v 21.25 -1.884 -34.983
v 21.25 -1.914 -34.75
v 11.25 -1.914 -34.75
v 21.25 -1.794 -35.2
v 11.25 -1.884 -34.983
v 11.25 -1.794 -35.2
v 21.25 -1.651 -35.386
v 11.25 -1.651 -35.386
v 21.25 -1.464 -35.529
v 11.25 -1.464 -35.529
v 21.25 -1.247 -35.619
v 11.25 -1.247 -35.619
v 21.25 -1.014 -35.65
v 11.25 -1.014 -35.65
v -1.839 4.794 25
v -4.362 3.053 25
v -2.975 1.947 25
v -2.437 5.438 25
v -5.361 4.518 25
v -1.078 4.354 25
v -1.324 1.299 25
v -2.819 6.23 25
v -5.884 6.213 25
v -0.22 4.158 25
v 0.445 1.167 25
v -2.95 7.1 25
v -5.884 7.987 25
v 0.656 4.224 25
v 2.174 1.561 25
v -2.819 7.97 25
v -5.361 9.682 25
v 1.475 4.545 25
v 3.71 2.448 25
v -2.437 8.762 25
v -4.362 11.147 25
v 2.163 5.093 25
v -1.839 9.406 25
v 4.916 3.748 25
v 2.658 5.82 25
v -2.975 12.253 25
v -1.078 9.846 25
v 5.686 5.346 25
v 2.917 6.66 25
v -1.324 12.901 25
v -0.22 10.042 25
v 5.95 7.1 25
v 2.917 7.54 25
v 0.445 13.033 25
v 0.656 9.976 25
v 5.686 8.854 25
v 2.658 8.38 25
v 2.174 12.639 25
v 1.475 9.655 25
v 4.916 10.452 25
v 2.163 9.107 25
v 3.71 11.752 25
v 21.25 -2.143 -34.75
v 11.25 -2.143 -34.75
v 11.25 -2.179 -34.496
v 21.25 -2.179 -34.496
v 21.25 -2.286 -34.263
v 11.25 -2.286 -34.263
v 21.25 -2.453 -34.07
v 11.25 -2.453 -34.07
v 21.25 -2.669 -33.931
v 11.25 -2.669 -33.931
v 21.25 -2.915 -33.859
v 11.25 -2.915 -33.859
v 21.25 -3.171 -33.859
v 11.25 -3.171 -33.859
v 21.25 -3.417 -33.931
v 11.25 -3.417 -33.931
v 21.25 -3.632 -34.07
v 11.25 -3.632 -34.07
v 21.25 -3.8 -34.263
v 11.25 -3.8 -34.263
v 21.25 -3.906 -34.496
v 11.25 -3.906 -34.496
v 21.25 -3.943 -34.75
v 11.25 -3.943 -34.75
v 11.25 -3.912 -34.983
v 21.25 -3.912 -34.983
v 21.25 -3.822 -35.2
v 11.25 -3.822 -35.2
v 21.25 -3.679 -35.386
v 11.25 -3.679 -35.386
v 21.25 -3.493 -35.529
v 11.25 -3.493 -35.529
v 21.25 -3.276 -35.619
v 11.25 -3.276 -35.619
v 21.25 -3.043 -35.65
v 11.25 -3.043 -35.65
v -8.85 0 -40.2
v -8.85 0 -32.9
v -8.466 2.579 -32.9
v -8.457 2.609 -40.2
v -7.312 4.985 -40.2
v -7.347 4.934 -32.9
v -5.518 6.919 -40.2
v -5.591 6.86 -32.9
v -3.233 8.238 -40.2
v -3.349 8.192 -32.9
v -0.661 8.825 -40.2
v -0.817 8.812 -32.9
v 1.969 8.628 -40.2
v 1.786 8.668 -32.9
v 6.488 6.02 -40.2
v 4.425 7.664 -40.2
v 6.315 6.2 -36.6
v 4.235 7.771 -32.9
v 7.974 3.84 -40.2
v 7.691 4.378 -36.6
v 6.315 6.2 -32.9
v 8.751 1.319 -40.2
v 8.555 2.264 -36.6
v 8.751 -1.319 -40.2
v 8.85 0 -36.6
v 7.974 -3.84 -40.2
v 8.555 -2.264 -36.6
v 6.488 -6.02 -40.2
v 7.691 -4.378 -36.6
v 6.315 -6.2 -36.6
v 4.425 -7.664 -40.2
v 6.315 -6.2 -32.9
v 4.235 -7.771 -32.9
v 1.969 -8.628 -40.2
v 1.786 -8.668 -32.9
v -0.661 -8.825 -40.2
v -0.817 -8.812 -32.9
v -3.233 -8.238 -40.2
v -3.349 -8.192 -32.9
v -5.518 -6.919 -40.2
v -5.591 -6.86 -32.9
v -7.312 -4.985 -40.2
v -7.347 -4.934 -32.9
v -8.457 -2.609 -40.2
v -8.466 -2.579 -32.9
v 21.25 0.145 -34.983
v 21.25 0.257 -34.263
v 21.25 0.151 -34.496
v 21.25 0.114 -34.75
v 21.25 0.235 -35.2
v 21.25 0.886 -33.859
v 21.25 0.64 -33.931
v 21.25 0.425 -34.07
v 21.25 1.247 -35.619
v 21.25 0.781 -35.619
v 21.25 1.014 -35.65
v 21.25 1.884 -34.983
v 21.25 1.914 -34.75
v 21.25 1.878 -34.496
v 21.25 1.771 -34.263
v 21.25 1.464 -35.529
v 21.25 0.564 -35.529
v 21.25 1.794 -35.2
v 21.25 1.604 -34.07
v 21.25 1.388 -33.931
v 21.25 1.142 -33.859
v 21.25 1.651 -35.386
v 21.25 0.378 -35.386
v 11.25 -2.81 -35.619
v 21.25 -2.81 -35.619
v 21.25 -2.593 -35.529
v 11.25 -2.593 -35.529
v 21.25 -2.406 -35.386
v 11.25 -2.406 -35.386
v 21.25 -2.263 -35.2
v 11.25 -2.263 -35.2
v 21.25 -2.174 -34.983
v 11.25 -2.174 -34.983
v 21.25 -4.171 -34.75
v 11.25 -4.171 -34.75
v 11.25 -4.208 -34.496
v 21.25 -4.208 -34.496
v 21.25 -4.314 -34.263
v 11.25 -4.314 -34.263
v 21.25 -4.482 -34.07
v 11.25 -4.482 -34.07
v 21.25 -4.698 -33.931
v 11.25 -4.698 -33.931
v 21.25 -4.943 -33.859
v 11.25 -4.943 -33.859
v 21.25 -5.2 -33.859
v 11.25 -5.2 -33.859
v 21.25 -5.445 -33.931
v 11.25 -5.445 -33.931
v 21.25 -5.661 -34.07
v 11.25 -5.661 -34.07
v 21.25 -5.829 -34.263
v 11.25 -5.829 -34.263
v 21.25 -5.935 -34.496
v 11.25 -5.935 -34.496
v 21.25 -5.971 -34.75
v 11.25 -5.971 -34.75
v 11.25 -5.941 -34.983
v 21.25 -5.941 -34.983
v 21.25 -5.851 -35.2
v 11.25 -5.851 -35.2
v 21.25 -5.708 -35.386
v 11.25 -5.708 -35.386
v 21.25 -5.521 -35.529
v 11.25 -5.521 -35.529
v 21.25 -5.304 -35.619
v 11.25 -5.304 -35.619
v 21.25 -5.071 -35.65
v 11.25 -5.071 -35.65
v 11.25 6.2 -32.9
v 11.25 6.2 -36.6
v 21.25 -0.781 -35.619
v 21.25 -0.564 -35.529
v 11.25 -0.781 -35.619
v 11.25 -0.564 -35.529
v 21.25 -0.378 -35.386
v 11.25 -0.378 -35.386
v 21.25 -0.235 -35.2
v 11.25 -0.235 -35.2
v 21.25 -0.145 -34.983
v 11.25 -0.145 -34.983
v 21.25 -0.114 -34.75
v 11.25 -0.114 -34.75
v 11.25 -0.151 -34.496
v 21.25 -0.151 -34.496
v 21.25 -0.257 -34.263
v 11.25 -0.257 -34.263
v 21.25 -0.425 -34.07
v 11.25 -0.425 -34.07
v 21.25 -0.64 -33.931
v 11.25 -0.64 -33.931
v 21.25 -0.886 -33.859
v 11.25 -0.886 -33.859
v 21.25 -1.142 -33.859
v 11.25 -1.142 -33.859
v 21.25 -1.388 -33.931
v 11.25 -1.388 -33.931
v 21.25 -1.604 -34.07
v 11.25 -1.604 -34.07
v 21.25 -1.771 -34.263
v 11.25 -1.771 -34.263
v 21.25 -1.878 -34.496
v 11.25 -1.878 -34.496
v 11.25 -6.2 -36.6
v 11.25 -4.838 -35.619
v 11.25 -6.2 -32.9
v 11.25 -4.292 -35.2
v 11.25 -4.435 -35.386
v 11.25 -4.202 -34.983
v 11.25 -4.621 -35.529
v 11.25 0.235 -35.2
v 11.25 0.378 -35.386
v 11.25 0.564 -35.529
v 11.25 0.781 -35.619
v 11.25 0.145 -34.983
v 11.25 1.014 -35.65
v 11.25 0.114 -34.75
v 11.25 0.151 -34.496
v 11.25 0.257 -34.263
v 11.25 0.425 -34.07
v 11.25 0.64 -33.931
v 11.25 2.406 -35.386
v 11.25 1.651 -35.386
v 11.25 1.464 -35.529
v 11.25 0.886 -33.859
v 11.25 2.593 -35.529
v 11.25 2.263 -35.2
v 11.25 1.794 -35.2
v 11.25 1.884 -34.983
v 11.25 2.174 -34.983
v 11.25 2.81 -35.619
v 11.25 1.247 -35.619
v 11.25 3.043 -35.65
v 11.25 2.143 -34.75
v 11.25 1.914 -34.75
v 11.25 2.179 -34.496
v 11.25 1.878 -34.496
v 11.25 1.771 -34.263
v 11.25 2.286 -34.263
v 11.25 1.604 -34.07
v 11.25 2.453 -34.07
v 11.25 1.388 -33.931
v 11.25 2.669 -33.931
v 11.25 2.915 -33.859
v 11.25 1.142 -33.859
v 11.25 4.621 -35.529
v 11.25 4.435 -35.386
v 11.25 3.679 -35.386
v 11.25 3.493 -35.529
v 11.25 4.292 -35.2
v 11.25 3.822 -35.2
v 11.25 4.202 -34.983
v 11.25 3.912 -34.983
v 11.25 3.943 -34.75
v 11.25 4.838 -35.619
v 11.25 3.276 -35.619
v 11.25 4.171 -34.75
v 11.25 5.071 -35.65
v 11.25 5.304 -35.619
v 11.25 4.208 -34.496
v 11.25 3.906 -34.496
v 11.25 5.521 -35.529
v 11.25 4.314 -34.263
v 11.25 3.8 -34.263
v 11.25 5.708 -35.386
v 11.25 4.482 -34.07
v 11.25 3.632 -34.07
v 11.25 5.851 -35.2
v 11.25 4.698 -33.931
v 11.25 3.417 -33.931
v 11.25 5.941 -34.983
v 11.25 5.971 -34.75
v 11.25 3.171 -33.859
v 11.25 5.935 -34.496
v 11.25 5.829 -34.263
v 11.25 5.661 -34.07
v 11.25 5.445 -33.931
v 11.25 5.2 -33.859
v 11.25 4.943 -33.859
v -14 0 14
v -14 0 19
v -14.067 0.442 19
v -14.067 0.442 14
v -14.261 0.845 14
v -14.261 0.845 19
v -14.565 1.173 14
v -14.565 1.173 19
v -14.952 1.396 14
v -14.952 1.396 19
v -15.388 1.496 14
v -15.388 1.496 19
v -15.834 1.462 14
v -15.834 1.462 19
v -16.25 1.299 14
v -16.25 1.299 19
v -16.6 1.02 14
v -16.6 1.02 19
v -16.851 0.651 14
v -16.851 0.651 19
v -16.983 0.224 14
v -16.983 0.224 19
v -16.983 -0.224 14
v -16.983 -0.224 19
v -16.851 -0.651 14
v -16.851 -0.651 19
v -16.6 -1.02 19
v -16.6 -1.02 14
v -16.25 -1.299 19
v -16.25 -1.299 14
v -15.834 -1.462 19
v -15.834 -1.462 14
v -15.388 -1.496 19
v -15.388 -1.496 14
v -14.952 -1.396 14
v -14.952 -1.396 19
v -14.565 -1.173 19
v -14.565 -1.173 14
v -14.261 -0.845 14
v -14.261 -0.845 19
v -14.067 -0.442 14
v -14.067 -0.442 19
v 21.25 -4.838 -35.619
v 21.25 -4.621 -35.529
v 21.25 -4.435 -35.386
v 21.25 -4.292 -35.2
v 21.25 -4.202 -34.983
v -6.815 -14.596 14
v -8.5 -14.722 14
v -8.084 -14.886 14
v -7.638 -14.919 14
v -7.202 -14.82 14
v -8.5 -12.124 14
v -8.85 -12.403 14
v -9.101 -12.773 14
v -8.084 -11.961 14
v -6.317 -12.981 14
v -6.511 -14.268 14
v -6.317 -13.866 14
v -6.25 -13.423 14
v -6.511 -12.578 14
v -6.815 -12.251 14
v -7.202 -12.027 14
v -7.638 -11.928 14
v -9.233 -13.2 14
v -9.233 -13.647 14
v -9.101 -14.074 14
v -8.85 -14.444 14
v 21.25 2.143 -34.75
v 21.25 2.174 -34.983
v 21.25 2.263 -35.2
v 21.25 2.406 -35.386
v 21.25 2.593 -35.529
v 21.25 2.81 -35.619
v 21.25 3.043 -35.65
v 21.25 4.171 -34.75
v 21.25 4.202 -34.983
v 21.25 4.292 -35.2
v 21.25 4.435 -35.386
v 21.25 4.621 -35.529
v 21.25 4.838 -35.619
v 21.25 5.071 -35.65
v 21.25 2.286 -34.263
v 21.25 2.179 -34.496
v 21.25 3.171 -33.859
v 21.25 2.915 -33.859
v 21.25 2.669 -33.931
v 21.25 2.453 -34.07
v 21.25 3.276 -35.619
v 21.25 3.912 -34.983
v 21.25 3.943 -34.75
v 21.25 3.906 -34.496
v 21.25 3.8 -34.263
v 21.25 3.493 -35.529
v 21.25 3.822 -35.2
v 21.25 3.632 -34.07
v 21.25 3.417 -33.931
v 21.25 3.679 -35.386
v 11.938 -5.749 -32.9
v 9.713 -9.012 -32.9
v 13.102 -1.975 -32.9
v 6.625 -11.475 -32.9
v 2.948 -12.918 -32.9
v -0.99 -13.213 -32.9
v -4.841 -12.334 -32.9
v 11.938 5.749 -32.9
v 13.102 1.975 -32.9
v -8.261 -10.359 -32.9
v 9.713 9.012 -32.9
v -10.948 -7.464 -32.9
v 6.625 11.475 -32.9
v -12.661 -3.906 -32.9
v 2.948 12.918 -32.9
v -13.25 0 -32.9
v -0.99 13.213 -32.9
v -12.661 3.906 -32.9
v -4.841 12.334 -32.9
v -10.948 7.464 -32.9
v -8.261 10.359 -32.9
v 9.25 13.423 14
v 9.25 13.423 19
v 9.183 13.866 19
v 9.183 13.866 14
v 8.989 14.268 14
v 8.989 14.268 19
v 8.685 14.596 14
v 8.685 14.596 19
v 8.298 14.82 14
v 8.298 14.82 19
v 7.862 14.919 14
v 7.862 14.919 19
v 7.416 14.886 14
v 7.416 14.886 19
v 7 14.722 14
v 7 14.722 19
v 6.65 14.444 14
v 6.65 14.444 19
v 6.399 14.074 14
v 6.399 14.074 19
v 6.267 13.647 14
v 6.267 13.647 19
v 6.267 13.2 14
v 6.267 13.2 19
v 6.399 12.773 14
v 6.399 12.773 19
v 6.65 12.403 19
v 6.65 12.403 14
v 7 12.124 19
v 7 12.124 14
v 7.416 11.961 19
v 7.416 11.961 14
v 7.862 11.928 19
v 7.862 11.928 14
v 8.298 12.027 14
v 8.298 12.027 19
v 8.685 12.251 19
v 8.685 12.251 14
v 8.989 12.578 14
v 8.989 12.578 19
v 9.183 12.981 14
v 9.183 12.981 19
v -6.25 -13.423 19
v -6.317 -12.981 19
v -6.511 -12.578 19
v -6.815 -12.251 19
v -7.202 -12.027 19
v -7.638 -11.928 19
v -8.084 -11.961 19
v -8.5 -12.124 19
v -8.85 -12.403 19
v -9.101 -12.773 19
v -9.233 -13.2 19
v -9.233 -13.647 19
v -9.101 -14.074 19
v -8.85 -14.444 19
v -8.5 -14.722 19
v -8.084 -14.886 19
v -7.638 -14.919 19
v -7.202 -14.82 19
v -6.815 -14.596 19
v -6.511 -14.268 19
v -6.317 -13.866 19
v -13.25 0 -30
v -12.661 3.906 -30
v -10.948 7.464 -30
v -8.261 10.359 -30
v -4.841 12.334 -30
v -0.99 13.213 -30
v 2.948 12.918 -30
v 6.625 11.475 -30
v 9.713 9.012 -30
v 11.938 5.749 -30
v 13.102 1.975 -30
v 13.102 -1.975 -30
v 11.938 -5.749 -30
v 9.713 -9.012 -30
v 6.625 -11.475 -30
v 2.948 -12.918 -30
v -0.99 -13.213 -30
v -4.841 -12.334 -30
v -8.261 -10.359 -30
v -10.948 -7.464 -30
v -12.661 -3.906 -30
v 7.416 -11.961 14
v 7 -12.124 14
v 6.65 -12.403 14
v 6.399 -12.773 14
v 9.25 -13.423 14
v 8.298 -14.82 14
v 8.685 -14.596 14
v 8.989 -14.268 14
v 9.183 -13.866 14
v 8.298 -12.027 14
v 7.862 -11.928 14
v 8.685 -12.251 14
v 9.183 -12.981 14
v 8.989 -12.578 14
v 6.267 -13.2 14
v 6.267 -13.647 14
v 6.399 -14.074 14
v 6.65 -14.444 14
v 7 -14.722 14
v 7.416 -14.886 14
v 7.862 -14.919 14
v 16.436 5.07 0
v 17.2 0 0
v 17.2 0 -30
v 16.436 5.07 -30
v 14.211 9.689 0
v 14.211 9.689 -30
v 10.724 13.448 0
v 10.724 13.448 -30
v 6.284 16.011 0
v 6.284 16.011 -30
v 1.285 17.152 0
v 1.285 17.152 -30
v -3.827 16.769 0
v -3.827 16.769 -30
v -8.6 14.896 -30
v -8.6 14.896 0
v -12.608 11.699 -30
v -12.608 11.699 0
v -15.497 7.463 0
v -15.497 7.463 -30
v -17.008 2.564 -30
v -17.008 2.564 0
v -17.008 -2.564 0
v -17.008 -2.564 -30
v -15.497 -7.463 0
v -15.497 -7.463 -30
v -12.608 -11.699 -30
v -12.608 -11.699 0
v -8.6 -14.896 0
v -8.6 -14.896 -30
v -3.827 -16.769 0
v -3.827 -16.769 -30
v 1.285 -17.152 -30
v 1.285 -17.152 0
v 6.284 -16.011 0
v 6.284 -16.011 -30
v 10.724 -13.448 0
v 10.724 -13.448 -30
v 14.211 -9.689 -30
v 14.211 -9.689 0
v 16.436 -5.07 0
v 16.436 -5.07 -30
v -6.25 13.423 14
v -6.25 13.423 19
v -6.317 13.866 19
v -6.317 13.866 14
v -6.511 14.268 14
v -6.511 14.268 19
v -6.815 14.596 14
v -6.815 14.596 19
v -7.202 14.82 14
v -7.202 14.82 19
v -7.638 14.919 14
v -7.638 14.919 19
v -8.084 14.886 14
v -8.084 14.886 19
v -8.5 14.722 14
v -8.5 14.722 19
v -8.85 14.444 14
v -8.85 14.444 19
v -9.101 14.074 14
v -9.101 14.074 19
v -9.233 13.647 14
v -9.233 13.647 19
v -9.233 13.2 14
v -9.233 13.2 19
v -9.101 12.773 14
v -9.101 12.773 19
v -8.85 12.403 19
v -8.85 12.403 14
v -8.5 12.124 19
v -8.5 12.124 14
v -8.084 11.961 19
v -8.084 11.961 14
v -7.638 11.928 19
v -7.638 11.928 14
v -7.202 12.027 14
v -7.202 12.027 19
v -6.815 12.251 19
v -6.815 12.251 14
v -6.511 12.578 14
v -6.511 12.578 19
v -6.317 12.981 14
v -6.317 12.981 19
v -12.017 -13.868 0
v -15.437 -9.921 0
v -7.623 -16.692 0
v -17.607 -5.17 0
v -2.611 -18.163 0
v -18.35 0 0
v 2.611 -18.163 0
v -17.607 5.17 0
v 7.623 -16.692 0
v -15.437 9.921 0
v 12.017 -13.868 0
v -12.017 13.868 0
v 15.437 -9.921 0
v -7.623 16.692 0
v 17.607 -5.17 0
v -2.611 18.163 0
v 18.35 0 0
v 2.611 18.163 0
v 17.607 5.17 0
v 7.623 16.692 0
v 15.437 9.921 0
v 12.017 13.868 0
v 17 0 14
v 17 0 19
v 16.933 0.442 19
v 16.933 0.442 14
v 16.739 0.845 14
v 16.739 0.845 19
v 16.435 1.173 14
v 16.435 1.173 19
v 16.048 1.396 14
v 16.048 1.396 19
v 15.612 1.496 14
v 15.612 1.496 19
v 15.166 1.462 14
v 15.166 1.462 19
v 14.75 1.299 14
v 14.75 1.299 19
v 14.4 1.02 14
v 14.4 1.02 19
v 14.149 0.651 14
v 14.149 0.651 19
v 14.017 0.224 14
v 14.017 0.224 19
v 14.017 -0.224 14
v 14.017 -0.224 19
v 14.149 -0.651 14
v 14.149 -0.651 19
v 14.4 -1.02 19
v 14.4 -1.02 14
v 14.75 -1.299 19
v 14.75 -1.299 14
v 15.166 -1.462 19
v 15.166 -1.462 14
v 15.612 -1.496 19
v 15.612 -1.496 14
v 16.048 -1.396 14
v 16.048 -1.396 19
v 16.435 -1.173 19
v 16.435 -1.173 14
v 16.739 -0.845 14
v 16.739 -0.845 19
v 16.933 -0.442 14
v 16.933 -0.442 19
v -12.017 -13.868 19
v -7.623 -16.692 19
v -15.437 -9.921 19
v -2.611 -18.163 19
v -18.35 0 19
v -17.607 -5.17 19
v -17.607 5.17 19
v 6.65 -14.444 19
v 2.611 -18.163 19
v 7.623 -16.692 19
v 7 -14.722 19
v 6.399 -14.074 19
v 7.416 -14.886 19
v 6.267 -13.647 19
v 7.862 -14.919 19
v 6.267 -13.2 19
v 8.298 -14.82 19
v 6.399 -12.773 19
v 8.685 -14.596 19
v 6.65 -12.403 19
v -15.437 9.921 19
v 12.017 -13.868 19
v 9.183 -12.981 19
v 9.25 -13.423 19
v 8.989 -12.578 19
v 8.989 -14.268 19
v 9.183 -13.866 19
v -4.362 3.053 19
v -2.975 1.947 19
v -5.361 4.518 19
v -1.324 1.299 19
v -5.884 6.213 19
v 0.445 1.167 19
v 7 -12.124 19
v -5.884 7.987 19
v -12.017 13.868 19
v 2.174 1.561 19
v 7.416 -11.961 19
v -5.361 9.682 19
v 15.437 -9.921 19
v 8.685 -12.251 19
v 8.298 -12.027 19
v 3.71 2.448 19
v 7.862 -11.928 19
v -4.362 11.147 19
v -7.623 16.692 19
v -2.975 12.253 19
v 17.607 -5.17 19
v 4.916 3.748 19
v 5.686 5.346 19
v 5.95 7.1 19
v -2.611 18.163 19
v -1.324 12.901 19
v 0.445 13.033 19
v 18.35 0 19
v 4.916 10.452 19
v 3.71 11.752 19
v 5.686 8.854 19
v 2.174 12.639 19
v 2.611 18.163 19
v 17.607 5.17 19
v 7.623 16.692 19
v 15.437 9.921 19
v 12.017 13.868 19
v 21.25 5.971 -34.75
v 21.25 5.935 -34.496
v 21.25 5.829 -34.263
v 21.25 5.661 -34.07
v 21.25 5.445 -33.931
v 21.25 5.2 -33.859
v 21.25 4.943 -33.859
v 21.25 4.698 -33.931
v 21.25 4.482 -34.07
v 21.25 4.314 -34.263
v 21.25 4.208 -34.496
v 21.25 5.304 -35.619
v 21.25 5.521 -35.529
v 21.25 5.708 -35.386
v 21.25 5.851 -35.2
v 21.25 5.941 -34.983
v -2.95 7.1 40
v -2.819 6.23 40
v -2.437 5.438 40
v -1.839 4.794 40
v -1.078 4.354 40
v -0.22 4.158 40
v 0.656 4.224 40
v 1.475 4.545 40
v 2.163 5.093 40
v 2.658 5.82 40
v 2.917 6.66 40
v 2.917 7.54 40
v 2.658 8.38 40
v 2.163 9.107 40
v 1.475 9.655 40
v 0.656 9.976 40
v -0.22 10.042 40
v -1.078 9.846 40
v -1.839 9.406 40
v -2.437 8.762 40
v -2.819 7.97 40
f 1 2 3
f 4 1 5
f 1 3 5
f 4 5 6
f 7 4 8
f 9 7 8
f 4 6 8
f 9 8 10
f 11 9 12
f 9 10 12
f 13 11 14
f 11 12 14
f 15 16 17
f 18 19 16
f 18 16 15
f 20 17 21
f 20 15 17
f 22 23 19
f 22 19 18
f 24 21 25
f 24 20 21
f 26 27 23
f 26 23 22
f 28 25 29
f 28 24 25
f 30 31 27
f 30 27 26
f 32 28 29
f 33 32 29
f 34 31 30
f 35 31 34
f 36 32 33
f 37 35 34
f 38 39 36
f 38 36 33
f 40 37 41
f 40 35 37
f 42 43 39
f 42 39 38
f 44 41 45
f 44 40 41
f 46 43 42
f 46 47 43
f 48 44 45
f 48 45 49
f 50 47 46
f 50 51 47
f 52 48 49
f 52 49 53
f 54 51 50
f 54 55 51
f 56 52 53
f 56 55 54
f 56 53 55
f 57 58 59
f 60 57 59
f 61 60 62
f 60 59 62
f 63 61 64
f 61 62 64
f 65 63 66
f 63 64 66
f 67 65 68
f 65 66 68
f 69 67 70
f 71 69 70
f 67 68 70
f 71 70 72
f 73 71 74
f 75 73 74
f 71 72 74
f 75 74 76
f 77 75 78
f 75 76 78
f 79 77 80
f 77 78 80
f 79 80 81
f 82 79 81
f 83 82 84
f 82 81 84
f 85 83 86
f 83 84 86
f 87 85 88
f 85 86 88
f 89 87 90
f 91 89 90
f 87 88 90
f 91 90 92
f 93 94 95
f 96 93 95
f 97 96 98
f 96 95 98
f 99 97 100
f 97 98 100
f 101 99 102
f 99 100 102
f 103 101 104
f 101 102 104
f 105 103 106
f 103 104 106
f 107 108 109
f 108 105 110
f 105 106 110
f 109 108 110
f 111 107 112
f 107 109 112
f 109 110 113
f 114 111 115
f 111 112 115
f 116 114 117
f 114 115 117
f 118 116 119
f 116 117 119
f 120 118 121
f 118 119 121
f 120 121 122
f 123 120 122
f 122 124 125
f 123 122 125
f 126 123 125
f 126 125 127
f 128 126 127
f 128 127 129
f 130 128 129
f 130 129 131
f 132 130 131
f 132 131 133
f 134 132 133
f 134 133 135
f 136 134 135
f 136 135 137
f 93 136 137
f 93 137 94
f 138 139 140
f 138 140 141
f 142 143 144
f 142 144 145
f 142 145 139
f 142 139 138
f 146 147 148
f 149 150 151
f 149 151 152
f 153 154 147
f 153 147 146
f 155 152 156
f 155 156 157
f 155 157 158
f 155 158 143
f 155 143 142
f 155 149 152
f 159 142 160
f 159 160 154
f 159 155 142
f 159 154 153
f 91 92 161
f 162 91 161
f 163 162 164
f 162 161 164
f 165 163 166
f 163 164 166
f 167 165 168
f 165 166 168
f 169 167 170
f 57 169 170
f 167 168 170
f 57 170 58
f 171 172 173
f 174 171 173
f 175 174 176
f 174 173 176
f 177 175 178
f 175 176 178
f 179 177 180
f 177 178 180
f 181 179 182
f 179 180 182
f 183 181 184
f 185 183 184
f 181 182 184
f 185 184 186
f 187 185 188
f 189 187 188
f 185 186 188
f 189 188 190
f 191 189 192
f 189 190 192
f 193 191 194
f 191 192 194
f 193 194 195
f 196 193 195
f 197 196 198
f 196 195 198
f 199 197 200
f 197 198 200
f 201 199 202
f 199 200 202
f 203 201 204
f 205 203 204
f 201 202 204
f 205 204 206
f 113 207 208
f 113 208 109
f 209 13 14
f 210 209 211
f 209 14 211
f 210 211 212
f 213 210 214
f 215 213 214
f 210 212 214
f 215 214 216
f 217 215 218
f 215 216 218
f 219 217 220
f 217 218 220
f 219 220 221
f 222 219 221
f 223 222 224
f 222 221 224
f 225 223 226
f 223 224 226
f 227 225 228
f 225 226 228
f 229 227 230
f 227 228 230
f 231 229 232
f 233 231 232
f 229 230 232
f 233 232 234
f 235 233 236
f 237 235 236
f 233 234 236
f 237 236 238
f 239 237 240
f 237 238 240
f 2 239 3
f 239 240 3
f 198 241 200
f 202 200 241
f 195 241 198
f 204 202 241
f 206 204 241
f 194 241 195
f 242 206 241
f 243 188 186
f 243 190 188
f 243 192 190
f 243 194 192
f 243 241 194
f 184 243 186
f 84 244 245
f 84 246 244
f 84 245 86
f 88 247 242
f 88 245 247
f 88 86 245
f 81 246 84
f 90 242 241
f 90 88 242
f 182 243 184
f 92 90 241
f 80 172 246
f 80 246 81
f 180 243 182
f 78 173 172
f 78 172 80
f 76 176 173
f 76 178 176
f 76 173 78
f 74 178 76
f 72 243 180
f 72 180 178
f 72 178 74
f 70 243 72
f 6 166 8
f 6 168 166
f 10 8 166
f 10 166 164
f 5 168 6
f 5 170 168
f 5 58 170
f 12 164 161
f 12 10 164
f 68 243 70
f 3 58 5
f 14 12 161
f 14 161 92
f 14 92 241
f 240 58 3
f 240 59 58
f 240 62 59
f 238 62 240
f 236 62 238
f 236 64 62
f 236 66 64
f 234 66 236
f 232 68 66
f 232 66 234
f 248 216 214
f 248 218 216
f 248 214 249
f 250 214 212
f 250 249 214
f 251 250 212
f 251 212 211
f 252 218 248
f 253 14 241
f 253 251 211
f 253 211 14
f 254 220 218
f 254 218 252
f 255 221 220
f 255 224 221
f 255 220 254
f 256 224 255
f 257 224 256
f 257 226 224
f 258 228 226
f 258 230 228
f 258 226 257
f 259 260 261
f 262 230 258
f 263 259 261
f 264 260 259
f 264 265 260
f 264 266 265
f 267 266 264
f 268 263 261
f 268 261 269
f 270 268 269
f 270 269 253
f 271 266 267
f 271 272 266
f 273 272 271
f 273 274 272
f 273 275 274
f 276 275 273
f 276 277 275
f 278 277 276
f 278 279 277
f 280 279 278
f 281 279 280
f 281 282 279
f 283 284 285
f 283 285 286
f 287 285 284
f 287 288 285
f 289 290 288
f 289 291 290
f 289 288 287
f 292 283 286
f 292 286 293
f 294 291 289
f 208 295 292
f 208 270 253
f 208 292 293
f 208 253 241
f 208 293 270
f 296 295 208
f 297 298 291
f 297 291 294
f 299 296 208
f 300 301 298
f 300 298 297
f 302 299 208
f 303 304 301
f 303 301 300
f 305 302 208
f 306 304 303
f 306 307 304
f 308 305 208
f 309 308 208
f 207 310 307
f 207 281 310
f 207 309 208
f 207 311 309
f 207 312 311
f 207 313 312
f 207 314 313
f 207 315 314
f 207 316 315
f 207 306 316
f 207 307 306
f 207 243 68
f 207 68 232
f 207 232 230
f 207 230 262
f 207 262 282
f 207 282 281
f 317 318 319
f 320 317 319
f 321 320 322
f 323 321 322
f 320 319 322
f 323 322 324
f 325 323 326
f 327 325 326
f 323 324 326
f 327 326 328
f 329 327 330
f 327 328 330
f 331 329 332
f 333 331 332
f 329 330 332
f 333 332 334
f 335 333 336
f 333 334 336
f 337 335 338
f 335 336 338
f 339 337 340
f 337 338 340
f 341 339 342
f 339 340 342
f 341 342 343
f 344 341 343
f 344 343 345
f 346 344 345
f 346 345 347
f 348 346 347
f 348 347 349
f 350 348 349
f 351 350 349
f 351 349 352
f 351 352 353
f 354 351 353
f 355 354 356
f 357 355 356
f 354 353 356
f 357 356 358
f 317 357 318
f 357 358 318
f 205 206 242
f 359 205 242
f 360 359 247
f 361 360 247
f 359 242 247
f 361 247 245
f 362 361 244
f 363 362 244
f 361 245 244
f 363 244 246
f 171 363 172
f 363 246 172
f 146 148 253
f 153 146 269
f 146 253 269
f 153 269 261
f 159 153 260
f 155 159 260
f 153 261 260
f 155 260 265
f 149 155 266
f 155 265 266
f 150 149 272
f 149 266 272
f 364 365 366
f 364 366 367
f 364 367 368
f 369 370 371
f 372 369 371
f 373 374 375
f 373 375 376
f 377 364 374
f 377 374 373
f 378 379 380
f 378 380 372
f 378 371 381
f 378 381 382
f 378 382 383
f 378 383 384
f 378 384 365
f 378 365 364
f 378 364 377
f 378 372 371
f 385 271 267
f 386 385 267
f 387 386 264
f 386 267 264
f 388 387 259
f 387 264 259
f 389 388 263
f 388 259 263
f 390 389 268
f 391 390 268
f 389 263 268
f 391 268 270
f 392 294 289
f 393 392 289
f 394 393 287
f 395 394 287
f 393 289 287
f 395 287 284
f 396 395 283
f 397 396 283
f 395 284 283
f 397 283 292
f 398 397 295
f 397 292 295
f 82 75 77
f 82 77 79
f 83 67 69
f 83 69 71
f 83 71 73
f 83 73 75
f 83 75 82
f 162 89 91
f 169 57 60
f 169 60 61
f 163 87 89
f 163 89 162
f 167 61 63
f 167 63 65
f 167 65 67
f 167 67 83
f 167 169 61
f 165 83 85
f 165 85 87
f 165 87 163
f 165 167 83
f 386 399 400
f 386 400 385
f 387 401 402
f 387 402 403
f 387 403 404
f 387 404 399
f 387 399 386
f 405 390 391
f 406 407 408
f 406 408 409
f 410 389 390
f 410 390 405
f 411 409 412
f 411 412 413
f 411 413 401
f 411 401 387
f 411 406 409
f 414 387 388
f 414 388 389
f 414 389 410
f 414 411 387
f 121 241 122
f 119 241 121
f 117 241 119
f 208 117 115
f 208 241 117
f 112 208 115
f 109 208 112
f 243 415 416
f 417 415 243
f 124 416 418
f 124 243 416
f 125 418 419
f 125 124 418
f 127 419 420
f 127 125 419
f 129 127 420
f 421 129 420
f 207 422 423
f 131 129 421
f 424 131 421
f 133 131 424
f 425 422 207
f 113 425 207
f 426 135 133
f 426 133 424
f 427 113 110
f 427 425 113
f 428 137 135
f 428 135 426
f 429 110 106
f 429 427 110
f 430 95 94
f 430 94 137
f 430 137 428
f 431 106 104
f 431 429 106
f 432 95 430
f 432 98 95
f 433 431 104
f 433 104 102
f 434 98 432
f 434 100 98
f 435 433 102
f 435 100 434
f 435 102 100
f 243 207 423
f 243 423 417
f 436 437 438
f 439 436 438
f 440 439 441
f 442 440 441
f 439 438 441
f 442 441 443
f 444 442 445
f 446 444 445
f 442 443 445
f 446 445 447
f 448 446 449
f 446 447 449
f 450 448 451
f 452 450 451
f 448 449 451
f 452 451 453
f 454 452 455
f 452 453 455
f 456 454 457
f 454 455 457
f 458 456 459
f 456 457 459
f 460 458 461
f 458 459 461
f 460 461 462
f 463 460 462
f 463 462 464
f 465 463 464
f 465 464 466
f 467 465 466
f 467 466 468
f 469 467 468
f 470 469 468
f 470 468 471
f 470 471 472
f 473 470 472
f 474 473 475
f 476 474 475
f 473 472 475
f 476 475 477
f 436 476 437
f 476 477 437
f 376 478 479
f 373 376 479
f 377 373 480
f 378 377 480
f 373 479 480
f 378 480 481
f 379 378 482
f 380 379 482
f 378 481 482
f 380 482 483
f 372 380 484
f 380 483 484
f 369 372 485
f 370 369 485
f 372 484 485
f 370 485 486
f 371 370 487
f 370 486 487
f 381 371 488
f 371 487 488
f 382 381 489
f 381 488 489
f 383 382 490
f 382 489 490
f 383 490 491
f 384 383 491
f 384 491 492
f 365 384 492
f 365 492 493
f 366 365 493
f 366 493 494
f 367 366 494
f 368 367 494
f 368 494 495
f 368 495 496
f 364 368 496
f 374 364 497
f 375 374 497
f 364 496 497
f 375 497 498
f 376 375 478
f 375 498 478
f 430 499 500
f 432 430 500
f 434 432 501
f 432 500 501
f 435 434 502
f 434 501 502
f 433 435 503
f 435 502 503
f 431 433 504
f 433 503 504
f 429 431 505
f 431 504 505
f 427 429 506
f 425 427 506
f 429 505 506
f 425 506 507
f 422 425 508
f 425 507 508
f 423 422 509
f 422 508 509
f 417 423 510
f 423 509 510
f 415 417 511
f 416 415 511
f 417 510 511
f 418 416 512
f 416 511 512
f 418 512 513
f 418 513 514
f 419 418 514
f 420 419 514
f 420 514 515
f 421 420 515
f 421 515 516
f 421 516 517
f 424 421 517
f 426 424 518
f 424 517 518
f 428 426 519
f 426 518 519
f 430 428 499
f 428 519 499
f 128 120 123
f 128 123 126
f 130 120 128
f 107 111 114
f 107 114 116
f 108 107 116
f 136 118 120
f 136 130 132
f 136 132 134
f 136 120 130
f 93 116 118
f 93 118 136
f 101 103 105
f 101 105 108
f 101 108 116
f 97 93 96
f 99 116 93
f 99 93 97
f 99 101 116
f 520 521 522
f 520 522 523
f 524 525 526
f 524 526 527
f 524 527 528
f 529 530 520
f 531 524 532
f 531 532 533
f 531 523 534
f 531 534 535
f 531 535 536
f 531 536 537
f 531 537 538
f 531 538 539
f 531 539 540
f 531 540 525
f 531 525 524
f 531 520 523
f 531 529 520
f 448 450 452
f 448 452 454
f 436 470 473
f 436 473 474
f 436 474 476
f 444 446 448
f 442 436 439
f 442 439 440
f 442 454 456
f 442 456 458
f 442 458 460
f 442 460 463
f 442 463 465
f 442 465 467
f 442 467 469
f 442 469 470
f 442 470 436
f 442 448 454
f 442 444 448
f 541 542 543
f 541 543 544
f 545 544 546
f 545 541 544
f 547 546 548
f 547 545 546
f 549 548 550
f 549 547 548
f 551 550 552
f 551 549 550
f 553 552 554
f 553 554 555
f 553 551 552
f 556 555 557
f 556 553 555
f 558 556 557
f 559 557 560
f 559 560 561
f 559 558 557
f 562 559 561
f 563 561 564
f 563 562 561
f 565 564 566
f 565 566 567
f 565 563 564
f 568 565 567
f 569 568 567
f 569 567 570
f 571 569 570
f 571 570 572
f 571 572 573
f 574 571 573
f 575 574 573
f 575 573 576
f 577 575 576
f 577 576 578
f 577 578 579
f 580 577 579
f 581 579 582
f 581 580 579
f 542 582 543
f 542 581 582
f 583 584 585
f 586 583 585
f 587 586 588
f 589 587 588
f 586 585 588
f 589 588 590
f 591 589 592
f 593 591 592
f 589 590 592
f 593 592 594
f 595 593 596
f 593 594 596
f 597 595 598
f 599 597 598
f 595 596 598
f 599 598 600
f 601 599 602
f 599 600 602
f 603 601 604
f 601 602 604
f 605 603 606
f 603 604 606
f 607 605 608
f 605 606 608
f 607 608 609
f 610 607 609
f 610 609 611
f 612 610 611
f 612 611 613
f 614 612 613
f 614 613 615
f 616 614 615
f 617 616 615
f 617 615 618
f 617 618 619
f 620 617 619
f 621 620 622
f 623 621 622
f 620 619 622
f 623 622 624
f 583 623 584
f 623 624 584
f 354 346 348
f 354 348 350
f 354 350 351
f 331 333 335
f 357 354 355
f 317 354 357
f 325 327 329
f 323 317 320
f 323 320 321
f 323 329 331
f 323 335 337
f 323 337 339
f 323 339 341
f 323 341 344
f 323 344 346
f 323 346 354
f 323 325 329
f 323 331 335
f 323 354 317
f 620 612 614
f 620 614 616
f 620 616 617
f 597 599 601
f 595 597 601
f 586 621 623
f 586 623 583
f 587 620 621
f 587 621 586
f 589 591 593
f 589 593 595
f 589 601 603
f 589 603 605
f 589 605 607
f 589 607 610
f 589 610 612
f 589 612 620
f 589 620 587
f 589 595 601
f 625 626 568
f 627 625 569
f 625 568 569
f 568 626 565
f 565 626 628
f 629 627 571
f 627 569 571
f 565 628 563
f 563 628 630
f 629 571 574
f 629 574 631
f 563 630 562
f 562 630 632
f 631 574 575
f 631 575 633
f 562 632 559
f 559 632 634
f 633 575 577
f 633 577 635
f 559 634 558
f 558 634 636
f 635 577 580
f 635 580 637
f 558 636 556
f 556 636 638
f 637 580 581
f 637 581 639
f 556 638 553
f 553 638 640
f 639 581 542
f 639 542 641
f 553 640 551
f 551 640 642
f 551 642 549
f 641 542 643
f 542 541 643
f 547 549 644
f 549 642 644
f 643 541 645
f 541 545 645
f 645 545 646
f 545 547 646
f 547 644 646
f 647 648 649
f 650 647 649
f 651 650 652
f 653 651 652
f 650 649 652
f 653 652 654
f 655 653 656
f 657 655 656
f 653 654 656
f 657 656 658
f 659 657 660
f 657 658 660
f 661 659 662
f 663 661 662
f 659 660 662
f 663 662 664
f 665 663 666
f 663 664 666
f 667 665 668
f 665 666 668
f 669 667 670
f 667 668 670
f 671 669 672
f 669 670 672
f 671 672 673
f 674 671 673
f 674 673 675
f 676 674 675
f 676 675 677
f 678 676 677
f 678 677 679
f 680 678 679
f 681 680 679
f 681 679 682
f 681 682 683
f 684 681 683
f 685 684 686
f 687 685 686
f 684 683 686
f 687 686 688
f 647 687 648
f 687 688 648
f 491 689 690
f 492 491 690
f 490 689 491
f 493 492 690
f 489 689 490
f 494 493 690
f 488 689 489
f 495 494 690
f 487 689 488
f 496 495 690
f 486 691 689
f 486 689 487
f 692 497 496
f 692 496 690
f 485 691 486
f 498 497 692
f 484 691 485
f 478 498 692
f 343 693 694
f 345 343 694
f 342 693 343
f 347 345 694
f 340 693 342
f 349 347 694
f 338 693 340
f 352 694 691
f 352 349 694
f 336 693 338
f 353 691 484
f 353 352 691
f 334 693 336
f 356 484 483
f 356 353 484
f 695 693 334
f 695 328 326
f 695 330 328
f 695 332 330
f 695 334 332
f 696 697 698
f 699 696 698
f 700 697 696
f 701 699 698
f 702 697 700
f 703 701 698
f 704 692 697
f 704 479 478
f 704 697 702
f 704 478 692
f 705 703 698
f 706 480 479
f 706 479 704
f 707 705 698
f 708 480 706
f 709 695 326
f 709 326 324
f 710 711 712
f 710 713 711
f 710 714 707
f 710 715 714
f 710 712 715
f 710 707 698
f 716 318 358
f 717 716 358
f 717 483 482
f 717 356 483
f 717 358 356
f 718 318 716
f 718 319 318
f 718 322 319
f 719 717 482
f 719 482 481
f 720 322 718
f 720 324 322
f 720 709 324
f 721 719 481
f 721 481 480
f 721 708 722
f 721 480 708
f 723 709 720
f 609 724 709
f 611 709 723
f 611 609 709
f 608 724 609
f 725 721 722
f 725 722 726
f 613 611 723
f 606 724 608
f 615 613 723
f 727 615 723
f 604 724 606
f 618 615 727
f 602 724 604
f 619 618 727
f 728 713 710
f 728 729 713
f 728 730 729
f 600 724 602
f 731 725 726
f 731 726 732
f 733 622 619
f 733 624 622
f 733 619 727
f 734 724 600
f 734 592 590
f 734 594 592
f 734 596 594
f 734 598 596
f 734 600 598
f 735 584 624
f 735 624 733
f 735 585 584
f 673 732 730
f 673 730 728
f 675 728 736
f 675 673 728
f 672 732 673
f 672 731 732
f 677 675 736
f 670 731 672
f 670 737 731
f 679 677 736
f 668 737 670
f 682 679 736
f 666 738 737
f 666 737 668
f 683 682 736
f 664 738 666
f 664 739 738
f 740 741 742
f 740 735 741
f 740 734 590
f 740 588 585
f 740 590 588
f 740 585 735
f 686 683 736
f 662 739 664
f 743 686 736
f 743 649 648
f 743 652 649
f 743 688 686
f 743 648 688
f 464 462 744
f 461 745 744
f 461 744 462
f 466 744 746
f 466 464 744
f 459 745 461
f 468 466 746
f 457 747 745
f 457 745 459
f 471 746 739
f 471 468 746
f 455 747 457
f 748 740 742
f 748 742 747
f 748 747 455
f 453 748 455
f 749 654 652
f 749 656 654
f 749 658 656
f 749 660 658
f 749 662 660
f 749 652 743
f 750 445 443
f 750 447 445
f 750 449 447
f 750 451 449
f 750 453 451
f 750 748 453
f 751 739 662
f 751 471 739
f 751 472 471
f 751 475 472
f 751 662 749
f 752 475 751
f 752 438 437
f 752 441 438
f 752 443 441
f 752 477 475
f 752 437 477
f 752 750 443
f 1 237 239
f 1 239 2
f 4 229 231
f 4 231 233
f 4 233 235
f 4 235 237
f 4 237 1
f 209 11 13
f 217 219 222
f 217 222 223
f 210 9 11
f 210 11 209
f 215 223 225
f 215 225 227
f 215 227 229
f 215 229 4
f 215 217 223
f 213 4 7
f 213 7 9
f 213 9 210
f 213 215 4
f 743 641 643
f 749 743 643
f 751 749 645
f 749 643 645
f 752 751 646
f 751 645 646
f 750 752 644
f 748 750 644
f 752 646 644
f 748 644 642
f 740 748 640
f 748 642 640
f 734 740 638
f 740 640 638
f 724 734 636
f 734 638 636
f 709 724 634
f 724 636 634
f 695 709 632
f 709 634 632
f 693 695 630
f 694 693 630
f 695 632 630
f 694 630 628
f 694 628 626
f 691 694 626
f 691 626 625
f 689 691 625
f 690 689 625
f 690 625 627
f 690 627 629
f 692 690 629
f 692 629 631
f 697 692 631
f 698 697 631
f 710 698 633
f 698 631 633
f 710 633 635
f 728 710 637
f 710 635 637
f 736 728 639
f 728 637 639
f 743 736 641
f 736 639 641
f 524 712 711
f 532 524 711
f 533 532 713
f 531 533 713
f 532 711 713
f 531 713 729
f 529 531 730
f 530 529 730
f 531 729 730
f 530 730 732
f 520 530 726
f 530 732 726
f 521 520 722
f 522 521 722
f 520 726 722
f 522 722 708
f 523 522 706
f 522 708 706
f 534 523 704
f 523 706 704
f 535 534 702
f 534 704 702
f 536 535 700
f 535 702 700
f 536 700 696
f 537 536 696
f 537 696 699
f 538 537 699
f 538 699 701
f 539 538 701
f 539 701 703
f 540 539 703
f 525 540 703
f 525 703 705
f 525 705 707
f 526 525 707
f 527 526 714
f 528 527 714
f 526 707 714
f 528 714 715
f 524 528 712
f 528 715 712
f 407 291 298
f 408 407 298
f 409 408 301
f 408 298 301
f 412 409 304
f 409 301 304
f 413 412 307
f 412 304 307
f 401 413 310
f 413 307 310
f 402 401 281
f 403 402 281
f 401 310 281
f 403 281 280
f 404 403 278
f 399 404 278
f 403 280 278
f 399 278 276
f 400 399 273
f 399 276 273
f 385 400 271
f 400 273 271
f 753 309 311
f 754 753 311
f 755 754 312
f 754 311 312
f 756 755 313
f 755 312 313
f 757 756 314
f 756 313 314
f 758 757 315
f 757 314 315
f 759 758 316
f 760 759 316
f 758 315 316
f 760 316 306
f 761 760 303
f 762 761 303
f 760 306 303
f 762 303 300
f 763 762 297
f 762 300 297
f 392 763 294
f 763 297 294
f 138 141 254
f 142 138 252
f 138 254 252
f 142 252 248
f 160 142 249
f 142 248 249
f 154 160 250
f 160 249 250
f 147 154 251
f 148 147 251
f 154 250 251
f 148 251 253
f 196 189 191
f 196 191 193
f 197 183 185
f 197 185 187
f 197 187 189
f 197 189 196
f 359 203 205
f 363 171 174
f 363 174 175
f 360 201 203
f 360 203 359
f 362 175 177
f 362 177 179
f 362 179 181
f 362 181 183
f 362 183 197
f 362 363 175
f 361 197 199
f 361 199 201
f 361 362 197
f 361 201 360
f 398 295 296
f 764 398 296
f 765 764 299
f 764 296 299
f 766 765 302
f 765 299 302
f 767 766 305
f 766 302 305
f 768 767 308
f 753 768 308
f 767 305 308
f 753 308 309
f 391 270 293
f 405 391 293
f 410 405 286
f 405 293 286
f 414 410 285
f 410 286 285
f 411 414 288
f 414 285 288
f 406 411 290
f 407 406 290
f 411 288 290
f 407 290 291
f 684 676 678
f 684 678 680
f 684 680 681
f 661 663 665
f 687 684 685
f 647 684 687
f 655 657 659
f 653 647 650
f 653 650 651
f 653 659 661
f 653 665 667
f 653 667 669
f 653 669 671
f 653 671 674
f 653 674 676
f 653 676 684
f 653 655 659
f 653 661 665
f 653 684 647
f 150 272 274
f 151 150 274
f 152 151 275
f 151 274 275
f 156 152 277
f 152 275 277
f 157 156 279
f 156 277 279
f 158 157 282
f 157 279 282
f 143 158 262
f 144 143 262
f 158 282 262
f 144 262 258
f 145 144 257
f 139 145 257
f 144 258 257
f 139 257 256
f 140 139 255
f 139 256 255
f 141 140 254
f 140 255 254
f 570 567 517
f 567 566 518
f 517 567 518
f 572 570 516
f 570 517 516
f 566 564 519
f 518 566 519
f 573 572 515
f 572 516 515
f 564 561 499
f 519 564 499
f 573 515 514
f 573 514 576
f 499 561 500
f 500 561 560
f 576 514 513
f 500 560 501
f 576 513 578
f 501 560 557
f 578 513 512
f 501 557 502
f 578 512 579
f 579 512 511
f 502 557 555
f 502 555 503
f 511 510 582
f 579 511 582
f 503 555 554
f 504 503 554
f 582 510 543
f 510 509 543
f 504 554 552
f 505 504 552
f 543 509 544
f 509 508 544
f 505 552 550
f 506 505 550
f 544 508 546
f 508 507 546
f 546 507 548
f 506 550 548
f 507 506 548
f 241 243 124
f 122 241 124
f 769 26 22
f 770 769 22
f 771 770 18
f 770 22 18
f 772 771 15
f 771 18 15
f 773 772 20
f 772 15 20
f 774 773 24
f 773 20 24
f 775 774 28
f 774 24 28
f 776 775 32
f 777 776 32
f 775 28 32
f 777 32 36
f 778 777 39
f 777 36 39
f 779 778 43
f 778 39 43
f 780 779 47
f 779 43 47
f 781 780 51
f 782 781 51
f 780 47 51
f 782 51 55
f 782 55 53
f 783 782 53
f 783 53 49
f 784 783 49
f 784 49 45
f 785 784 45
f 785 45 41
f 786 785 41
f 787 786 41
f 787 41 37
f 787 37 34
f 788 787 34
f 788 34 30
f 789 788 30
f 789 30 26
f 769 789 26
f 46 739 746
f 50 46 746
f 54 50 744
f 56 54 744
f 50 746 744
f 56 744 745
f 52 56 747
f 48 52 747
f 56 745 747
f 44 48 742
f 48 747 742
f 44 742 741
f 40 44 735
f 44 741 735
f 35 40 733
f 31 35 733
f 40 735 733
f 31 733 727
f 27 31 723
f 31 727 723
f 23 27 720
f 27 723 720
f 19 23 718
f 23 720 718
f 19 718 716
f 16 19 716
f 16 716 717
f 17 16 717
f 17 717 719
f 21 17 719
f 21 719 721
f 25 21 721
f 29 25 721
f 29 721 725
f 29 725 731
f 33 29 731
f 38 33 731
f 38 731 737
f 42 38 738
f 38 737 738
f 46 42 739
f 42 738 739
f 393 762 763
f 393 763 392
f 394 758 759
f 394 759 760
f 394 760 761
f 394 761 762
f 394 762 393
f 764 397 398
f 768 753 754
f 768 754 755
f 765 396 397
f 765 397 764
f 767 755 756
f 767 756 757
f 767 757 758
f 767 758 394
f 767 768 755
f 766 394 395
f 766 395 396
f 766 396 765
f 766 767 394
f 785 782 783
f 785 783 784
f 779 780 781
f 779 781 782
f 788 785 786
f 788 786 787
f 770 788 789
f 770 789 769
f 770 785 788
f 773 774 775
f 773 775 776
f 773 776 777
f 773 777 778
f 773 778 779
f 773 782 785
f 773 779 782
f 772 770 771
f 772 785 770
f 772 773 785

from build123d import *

# Parameters (mm, degrees)
SKETCH1_R           = 18.35
BOSS_EXTRUDE1_DEPTH = 19
SKETCH1_3_R         = 17.2
BOSS_EXTRUDE2_DEPTH = 30
SKETCH2_R           = 1.5
CUT_EXTRUDE1_DEPTH  = 5
SKETCH2_3_R         = 5.95
BOSS_EXTRUDE3_DEPTH = 6
SKETCH2_4_R         = 2.95
BOSS_EXTRUDE4_DEPTH = 21
SKETCH3_R           = 13.25
BOSS_EXTRUDE5_DEPTH = 2.9
SKETCH4_R           = 8.85
BOSS_EXTRUDE6_DEPTH = 10.2
SKETCH5_W           = 5.5
SKETCH5_H           = 12.4
BOSS_EXTRUDE7_DEPTH = 6.6
SKETCH6_R           = 0.9
BOSS_EXTRUDE8_DEPTH = 10


with BuildPart() as part:
    # Sketch1 → Boss-Extrude1 (new body)
    with BuildSketch(Plane.XY):
        Circle(SKETCH1_R)
    extrude(amount=BOSS_EXTRUDE1_DEPTH)

    # Sketch1<3> → Boss-Extrude2 (add)
    with BuildSketch(Plane.XY):
        Circle(SKETCH1_3_R)
    extrude(amount=-BOSS_EXTRUDE2_DEPTH)

    # Sketch2 → Cut-Extrude1 (cut)
    with BuildSketch(Plane.XY.offset(19)):
        with Locations((15.5, 0)):
            Circle(SKETCH2_R)
        with Locations((7.75, -13.423393759)):
            Circle(SKETCH2_R)
        with Locations((-7.75, -13.423393759)):
            Circle(SKETCH2_R)
        with Locations((-15.5, 0)):
            Circle(SKETCH2_R)
        with Locations((-7.75, 13.423393759)):
            Circle(SKETCH2_R)
        with Locations((7.75, 13.423393759)):
            Circle(SKETCH2_R)
    extrude(amount=-CUT_EXTRUDE1_DEPTH, mode=Mode.SUBTRACT)

    # Sketch2<3> → Boss-Extrude3 (add)
    with BuildSketch(Plane.XY.offset(19)):
        with Locations((0, 7.1)):
            Circle(SKETCH2_3_R)
    extrude(amount=BOSS_EXTRUDE3_DEPTH)

    # Sketch2<4> → Boss-Extrude4 (add)
    with BuildSketch(Plane.XY.offset(19)):
        with Locations((0, 7.1)):
            Circle(SKETCH2_4_R)
    extrude(amount=BOSS_EXTRUDE4_DEPTH)

    # Sketch3 → Boss-Extrude5 (add)
    with BuildSketch(Plane(origin=(0, 0, -30), x_dir=(-1, 0, 0), z_dir=(0, 0, -1))):
        Circle(SKETCH3_R)
    extrude(amount=BOSS_EXTRUDE5_DEPTH)

    # Sketch4 → Boss-Extrude6 (add)
    with BuildSketch(Plane(origin=(0, 0, -30), x_dir=(-1, 0, 0), z_dir=(0, 0, -1))):
        Circle(SKETCH4_R)
    extrude(amount=BOSS_EXTRUDE6_DEPTH)

    # Sketch5 → Boss-Extrude7 (add)
    with BuildSketch(Plane(origin=(0, 0, -30), x_dir=(-1, 0, 0), z_dir=(0, 0, -1))):
        with Locations((-8.5, 0)):
            Rectangle(SKETCH5_W, SKETCH5_H)
    extrude(amount=BOSS_EXTRUDE7_DEPTH)

    # Sketch6 → Boss-Extrude8 (add)
    with BuildSketch(Plane(origin=(11.25, 0, 0), x_dir=(0, 0, -1), z_dir=(1, 0, 0))):
        with Locations((34.75, 5.071428571)):
            Circle(SKETCH6_R)
        with Locations((34.75, -5.071428571)):
            Circle(SKETCH6_R)
        with Locations((34.75, -3.042857143)):
            Circle(SKETCH6_R)
        with Locations((34.75, -1.014285714)):
            Circle(SKETCH6_R)
        with Locations((34.75, 1.014285714)):
            Circle(SKETCH6_R)
        with Locations((34.75, 3.042857143)):
            Circle(SKETCH6_R)
    extrude(amount=BOSS_EXTRUDE8_DEPTH)


solid = part.part
